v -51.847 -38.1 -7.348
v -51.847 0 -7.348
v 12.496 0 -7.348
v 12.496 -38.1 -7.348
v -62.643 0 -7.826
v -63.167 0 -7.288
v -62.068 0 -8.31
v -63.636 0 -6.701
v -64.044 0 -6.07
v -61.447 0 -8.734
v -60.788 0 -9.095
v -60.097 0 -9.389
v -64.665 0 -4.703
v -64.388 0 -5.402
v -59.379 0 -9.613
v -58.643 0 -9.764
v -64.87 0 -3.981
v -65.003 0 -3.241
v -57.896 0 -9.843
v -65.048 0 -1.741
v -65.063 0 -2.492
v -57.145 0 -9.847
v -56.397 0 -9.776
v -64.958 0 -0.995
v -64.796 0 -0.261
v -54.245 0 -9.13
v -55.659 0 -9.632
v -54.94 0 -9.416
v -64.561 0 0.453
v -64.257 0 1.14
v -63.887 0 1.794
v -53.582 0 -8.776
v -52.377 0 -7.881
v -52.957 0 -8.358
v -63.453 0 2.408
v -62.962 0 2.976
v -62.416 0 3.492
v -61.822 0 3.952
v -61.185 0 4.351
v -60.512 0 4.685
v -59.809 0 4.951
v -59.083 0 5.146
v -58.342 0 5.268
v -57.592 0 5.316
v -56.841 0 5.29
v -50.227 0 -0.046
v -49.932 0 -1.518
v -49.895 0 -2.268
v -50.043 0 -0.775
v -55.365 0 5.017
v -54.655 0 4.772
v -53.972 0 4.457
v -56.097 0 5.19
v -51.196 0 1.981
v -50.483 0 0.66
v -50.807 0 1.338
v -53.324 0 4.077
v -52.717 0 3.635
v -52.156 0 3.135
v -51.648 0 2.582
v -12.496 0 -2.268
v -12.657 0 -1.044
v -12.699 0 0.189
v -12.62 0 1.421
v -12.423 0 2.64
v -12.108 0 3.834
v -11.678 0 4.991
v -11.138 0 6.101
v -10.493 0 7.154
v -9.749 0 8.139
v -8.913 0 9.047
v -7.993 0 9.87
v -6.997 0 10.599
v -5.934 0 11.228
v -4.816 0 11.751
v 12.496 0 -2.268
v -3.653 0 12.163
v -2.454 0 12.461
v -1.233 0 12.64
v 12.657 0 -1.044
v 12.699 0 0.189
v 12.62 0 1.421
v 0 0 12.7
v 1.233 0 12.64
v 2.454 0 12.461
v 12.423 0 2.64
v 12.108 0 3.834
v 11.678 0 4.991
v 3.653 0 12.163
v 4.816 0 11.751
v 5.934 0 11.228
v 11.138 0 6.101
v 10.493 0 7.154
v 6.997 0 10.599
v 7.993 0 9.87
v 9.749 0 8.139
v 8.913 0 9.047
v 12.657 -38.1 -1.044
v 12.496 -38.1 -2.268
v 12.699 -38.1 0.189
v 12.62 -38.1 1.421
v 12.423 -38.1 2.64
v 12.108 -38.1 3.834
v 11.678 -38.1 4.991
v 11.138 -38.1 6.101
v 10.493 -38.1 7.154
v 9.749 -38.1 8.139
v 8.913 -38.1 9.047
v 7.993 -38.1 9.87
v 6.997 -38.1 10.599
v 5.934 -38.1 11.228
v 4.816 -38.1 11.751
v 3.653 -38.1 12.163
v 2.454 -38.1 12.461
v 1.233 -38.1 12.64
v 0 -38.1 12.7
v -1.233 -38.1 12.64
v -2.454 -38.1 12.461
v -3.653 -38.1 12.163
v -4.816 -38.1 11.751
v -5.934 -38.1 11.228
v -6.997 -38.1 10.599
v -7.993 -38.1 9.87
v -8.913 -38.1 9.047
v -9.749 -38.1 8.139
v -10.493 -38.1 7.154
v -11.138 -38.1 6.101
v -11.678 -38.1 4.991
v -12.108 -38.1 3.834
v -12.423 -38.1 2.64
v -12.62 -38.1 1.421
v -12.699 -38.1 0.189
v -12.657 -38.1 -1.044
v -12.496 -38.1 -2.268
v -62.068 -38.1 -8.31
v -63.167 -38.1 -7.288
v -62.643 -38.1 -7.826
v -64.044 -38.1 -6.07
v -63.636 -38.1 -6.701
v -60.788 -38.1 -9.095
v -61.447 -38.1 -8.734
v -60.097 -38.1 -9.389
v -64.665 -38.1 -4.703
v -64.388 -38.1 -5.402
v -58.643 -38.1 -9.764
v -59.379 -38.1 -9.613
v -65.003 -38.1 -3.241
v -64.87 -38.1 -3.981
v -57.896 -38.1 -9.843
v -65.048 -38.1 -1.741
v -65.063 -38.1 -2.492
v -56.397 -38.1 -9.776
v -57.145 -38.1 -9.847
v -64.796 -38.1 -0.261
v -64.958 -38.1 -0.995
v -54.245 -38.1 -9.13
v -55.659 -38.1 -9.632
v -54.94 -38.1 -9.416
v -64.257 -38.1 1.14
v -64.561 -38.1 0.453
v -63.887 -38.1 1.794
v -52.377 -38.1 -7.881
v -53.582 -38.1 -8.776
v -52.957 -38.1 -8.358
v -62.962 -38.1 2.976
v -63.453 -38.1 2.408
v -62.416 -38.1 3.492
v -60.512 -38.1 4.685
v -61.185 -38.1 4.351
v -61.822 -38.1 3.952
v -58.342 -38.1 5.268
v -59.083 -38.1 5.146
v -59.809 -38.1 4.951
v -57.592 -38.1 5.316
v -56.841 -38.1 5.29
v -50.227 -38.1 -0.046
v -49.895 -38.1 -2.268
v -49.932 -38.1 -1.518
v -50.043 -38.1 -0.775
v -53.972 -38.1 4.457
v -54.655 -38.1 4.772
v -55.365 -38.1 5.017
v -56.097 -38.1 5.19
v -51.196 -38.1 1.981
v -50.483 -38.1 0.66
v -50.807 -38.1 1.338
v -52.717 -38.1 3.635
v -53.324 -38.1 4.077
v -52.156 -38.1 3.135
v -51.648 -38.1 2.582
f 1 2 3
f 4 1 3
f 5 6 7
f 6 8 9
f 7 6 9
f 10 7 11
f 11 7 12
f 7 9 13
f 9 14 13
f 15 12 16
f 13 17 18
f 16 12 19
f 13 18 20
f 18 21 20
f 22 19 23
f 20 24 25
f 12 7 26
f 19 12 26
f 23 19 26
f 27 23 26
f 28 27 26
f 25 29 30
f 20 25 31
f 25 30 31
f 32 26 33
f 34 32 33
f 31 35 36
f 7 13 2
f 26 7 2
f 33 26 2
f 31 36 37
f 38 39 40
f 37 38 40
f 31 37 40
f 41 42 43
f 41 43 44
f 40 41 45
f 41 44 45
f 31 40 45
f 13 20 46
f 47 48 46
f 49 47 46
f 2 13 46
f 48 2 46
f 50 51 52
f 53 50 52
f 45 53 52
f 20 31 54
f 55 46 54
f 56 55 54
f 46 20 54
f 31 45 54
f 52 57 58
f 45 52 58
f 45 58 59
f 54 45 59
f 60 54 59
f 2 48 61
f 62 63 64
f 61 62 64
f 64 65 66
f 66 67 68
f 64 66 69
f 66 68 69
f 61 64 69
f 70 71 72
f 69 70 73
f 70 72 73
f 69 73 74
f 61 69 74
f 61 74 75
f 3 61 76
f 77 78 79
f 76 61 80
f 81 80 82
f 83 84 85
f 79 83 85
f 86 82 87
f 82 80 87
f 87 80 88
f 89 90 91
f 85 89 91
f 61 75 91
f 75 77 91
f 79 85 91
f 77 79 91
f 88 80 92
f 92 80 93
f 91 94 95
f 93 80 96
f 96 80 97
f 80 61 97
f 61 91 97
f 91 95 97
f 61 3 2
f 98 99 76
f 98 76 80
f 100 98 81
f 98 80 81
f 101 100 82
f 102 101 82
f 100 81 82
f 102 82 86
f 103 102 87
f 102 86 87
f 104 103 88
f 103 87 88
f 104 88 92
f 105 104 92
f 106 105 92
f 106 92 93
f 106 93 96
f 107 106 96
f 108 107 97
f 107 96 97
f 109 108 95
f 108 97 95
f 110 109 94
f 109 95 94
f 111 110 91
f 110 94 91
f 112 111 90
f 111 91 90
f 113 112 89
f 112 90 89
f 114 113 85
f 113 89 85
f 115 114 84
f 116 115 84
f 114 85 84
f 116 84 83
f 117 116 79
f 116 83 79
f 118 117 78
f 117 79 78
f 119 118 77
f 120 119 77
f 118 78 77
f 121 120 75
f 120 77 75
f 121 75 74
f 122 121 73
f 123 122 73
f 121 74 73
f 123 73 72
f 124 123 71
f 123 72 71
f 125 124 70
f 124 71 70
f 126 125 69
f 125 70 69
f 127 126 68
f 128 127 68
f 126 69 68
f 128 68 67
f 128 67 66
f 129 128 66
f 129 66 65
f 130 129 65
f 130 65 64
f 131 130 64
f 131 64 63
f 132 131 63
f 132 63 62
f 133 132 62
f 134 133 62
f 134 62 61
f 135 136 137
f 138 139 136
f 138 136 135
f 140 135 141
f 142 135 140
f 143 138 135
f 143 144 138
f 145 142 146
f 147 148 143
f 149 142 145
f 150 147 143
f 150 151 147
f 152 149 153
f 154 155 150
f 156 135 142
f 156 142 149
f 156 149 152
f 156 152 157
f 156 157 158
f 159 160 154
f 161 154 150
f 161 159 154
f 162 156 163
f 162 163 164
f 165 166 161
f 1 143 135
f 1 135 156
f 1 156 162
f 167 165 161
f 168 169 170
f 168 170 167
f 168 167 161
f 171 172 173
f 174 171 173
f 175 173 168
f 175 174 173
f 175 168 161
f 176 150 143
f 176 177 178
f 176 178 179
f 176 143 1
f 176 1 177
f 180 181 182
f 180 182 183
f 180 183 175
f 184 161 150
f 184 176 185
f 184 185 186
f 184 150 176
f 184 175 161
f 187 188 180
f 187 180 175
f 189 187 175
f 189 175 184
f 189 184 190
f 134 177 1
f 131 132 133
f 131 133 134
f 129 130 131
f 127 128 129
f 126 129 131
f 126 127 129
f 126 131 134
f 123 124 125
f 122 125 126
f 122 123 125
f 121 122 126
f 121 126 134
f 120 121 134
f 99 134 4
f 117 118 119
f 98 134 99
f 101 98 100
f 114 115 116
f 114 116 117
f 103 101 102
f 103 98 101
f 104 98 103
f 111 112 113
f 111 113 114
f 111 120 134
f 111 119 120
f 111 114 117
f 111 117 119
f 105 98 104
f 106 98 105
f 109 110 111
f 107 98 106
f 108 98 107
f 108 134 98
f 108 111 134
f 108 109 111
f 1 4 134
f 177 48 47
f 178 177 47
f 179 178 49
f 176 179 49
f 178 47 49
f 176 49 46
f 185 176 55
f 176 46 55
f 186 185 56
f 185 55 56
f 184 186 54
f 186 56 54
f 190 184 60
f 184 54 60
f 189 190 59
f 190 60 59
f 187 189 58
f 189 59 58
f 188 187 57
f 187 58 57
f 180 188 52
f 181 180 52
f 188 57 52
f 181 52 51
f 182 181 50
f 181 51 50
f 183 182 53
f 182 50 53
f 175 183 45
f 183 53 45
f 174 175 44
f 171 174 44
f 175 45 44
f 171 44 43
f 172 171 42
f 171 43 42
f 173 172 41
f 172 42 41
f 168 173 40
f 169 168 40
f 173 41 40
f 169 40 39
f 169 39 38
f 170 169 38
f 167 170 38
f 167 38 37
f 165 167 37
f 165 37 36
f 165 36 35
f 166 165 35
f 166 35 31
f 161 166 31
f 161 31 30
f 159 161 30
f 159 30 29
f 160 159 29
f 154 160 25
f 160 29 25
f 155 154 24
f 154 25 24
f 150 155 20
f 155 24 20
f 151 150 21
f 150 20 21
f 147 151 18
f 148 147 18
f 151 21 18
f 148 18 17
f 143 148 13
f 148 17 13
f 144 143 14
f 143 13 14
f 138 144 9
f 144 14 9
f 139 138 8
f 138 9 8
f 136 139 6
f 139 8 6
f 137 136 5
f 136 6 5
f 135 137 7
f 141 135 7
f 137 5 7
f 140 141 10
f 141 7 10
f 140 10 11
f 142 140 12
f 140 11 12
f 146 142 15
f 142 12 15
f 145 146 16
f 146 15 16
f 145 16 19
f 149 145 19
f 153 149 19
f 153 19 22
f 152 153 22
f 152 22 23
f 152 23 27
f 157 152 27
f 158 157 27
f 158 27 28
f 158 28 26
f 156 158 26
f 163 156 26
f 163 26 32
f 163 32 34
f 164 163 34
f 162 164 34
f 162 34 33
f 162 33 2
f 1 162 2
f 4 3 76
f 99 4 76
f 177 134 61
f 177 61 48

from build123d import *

# Parameters (mm, degrees)
F1_DEPTH = 38.1


# Not quite as in the source:
# - the program builds the solid bodies; features that only make, move or delete a surface that nothing else refers to are left out


with BuildPart() as f1:
    # F0 (on Front) → F1 (new body)
    with BuildSketch(Plane.XZ):
        with BuildLine():
            Line((-12.4957701793, -2.2684196318), (12.4957701793, -2.2684196318))
            ThreePointArc((12.4957701793, -2.2684196318), (0, 12.7), (-12.4957701793, -2.2684196318))
        make_face()
        with BuildLine():
            Line((12.4957701793, -7.3484196318), (12.4957701793, -2.2684196318))
            Line((12.4957701793, -2.2684196318), (-12.4957701793, -2.2684196318))
            Line((-12.4957701793, -2.2684196318), (-49.8945600124, -2.2684196318))
            ThreePointArc((-49.8945600124, -2.2684196318), (-50.3994056233, -4.9895144213), (-51.8467453044, -7.3484196318))
            Line((-51.8467453044, -7.3484196318), (12.4957701793, -7.3484196318))
        make_face()
        with BuildLine():
            ThreePointArc((-51.8467453044, -7.3484196318), (-50.3994056233, -4.9895144213), (-49.8945600124, -2.2684196318))
            Line((-49.8945600124, -2.2684196318), (-57.4802711475, -2.2684196318))
            Line((-57.4802711475, -2.2684196318), (-57.4802711475, -7.3484196318))
            Line((-57.4802711475, -7.3484196318), (-51.8467453044, -7.3484196318))
        make_face()
        with BuildLine():
            Line((-57.4802711475, -2.2684196318), (-49.8945600124, -2.2684196318))
            ThreePointArc((-49.8945600124, -2.2684196318), (-64.5611366718, 0.4526751578), (-51.8467453044, -7.3484196318))
            Line((-51.8467453044, -7.3484196318), (-57.4802711475, -7.3484196318))
            Line((-57.4802711475, -7.3484196318), (-57.4802711475, -2.2684196318))
        make_face()
    extrude(amount=F1_DEPTH)


solid = f1.part
